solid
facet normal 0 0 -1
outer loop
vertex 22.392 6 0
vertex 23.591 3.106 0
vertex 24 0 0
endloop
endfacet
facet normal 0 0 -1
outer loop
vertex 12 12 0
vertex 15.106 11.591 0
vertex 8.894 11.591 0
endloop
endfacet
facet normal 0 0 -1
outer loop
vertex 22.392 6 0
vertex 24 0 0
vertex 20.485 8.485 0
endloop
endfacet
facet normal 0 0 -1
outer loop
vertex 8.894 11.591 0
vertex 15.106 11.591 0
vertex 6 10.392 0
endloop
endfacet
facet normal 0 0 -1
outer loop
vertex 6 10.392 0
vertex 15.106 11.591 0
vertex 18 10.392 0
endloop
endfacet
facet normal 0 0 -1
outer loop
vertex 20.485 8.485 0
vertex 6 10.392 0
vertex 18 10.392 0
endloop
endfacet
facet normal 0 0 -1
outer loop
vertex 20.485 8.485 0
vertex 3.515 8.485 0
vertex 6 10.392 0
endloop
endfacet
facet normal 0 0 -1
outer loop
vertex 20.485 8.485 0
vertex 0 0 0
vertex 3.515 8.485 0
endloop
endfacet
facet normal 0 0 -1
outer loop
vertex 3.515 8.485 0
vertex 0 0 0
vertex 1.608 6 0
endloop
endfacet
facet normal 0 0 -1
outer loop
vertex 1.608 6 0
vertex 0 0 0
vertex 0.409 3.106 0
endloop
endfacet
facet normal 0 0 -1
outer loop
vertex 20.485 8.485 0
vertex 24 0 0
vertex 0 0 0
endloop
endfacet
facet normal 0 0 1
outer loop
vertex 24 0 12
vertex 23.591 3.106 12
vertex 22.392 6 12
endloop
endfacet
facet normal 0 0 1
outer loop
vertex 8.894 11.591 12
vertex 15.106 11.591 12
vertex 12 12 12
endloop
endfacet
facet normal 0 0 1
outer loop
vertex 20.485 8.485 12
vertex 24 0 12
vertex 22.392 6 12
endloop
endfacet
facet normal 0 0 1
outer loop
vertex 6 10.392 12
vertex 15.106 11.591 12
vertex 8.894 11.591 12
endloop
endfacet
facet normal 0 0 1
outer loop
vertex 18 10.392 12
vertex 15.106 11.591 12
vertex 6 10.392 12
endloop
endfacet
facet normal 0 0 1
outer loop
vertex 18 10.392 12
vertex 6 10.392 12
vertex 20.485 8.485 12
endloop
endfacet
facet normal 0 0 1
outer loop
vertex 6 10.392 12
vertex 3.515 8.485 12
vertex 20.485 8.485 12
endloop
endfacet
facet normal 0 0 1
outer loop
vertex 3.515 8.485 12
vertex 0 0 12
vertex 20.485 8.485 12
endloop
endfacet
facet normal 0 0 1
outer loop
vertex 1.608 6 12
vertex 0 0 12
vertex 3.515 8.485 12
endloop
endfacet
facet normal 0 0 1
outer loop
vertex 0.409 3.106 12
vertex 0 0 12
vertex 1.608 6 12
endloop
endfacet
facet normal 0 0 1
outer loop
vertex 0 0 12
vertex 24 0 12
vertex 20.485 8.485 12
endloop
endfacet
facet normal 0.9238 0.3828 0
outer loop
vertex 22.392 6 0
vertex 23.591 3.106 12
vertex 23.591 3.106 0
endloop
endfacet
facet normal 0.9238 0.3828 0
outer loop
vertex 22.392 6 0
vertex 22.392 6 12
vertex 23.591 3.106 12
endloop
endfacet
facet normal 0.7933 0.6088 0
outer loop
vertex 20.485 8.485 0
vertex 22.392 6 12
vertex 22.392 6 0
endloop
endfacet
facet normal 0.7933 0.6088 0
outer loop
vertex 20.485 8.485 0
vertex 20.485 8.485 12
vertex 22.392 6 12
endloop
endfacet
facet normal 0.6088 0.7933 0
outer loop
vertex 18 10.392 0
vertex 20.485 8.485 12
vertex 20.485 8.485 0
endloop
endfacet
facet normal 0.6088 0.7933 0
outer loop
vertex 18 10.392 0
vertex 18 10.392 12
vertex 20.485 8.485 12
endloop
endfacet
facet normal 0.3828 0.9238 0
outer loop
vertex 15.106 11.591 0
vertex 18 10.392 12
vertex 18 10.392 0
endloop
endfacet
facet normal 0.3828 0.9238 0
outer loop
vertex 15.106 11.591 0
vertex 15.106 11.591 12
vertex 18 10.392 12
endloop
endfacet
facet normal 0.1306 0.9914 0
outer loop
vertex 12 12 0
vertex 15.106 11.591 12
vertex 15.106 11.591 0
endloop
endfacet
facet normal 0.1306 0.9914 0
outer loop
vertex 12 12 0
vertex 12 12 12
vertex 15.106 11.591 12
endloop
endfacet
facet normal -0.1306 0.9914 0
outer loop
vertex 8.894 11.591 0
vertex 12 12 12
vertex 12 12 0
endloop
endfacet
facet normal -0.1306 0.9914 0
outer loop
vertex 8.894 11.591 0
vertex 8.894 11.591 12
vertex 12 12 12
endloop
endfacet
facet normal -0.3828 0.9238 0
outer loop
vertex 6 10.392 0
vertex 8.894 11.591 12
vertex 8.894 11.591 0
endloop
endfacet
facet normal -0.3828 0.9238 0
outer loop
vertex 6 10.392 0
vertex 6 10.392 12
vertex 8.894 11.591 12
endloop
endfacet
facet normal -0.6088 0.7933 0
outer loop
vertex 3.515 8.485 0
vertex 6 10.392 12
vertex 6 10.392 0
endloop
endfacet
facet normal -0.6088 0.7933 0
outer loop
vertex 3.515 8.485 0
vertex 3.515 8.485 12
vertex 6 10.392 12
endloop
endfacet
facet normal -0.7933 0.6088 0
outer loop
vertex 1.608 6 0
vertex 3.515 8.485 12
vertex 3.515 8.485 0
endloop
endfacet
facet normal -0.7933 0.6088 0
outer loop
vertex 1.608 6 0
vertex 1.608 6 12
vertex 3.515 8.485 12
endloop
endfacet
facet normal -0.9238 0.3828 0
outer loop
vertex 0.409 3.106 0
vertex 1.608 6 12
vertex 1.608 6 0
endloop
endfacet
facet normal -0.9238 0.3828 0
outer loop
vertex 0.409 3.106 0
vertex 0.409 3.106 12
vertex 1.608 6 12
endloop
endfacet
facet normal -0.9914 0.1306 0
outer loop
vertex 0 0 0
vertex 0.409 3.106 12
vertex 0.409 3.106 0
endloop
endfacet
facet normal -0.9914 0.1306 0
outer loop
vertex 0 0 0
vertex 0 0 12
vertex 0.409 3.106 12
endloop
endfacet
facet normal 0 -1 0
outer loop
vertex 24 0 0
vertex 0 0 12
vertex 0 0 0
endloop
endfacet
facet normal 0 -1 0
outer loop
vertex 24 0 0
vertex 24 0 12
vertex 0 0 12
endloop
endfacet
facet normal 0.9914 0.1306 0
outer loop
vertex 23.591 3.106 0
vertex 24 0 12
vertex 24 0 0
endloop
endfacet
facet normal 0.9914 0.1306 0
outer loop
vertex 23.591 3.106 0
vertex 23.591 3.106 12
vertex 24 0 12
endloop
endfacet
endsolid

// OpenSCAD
$fn = 32;

// ----------------------------------------------------------------------
// Key bar: woodruff key, 12 mm thick
// ----------------------------------------------------------------------

// --- parameters (mm) ---
profile_height = 12;      // extrusion height
profile_points = 13;      // points of the closed outline

profile = [[24, 0], [23.591, 3.106], [22.392, 6], [20.485, 8.485], [18, 10.392], [15.106, 11.591], [12, 12], [8.894, 11.591], [6, 10.392], [3.515, 8.485], [1.608, 6], [0.409, 3.106], [0, 0]];  // single closed polygon, 13 points, counter clockwise

// --- the one profile operation ---
linear_extrude(height = profile_height) polygon(points = profile);
